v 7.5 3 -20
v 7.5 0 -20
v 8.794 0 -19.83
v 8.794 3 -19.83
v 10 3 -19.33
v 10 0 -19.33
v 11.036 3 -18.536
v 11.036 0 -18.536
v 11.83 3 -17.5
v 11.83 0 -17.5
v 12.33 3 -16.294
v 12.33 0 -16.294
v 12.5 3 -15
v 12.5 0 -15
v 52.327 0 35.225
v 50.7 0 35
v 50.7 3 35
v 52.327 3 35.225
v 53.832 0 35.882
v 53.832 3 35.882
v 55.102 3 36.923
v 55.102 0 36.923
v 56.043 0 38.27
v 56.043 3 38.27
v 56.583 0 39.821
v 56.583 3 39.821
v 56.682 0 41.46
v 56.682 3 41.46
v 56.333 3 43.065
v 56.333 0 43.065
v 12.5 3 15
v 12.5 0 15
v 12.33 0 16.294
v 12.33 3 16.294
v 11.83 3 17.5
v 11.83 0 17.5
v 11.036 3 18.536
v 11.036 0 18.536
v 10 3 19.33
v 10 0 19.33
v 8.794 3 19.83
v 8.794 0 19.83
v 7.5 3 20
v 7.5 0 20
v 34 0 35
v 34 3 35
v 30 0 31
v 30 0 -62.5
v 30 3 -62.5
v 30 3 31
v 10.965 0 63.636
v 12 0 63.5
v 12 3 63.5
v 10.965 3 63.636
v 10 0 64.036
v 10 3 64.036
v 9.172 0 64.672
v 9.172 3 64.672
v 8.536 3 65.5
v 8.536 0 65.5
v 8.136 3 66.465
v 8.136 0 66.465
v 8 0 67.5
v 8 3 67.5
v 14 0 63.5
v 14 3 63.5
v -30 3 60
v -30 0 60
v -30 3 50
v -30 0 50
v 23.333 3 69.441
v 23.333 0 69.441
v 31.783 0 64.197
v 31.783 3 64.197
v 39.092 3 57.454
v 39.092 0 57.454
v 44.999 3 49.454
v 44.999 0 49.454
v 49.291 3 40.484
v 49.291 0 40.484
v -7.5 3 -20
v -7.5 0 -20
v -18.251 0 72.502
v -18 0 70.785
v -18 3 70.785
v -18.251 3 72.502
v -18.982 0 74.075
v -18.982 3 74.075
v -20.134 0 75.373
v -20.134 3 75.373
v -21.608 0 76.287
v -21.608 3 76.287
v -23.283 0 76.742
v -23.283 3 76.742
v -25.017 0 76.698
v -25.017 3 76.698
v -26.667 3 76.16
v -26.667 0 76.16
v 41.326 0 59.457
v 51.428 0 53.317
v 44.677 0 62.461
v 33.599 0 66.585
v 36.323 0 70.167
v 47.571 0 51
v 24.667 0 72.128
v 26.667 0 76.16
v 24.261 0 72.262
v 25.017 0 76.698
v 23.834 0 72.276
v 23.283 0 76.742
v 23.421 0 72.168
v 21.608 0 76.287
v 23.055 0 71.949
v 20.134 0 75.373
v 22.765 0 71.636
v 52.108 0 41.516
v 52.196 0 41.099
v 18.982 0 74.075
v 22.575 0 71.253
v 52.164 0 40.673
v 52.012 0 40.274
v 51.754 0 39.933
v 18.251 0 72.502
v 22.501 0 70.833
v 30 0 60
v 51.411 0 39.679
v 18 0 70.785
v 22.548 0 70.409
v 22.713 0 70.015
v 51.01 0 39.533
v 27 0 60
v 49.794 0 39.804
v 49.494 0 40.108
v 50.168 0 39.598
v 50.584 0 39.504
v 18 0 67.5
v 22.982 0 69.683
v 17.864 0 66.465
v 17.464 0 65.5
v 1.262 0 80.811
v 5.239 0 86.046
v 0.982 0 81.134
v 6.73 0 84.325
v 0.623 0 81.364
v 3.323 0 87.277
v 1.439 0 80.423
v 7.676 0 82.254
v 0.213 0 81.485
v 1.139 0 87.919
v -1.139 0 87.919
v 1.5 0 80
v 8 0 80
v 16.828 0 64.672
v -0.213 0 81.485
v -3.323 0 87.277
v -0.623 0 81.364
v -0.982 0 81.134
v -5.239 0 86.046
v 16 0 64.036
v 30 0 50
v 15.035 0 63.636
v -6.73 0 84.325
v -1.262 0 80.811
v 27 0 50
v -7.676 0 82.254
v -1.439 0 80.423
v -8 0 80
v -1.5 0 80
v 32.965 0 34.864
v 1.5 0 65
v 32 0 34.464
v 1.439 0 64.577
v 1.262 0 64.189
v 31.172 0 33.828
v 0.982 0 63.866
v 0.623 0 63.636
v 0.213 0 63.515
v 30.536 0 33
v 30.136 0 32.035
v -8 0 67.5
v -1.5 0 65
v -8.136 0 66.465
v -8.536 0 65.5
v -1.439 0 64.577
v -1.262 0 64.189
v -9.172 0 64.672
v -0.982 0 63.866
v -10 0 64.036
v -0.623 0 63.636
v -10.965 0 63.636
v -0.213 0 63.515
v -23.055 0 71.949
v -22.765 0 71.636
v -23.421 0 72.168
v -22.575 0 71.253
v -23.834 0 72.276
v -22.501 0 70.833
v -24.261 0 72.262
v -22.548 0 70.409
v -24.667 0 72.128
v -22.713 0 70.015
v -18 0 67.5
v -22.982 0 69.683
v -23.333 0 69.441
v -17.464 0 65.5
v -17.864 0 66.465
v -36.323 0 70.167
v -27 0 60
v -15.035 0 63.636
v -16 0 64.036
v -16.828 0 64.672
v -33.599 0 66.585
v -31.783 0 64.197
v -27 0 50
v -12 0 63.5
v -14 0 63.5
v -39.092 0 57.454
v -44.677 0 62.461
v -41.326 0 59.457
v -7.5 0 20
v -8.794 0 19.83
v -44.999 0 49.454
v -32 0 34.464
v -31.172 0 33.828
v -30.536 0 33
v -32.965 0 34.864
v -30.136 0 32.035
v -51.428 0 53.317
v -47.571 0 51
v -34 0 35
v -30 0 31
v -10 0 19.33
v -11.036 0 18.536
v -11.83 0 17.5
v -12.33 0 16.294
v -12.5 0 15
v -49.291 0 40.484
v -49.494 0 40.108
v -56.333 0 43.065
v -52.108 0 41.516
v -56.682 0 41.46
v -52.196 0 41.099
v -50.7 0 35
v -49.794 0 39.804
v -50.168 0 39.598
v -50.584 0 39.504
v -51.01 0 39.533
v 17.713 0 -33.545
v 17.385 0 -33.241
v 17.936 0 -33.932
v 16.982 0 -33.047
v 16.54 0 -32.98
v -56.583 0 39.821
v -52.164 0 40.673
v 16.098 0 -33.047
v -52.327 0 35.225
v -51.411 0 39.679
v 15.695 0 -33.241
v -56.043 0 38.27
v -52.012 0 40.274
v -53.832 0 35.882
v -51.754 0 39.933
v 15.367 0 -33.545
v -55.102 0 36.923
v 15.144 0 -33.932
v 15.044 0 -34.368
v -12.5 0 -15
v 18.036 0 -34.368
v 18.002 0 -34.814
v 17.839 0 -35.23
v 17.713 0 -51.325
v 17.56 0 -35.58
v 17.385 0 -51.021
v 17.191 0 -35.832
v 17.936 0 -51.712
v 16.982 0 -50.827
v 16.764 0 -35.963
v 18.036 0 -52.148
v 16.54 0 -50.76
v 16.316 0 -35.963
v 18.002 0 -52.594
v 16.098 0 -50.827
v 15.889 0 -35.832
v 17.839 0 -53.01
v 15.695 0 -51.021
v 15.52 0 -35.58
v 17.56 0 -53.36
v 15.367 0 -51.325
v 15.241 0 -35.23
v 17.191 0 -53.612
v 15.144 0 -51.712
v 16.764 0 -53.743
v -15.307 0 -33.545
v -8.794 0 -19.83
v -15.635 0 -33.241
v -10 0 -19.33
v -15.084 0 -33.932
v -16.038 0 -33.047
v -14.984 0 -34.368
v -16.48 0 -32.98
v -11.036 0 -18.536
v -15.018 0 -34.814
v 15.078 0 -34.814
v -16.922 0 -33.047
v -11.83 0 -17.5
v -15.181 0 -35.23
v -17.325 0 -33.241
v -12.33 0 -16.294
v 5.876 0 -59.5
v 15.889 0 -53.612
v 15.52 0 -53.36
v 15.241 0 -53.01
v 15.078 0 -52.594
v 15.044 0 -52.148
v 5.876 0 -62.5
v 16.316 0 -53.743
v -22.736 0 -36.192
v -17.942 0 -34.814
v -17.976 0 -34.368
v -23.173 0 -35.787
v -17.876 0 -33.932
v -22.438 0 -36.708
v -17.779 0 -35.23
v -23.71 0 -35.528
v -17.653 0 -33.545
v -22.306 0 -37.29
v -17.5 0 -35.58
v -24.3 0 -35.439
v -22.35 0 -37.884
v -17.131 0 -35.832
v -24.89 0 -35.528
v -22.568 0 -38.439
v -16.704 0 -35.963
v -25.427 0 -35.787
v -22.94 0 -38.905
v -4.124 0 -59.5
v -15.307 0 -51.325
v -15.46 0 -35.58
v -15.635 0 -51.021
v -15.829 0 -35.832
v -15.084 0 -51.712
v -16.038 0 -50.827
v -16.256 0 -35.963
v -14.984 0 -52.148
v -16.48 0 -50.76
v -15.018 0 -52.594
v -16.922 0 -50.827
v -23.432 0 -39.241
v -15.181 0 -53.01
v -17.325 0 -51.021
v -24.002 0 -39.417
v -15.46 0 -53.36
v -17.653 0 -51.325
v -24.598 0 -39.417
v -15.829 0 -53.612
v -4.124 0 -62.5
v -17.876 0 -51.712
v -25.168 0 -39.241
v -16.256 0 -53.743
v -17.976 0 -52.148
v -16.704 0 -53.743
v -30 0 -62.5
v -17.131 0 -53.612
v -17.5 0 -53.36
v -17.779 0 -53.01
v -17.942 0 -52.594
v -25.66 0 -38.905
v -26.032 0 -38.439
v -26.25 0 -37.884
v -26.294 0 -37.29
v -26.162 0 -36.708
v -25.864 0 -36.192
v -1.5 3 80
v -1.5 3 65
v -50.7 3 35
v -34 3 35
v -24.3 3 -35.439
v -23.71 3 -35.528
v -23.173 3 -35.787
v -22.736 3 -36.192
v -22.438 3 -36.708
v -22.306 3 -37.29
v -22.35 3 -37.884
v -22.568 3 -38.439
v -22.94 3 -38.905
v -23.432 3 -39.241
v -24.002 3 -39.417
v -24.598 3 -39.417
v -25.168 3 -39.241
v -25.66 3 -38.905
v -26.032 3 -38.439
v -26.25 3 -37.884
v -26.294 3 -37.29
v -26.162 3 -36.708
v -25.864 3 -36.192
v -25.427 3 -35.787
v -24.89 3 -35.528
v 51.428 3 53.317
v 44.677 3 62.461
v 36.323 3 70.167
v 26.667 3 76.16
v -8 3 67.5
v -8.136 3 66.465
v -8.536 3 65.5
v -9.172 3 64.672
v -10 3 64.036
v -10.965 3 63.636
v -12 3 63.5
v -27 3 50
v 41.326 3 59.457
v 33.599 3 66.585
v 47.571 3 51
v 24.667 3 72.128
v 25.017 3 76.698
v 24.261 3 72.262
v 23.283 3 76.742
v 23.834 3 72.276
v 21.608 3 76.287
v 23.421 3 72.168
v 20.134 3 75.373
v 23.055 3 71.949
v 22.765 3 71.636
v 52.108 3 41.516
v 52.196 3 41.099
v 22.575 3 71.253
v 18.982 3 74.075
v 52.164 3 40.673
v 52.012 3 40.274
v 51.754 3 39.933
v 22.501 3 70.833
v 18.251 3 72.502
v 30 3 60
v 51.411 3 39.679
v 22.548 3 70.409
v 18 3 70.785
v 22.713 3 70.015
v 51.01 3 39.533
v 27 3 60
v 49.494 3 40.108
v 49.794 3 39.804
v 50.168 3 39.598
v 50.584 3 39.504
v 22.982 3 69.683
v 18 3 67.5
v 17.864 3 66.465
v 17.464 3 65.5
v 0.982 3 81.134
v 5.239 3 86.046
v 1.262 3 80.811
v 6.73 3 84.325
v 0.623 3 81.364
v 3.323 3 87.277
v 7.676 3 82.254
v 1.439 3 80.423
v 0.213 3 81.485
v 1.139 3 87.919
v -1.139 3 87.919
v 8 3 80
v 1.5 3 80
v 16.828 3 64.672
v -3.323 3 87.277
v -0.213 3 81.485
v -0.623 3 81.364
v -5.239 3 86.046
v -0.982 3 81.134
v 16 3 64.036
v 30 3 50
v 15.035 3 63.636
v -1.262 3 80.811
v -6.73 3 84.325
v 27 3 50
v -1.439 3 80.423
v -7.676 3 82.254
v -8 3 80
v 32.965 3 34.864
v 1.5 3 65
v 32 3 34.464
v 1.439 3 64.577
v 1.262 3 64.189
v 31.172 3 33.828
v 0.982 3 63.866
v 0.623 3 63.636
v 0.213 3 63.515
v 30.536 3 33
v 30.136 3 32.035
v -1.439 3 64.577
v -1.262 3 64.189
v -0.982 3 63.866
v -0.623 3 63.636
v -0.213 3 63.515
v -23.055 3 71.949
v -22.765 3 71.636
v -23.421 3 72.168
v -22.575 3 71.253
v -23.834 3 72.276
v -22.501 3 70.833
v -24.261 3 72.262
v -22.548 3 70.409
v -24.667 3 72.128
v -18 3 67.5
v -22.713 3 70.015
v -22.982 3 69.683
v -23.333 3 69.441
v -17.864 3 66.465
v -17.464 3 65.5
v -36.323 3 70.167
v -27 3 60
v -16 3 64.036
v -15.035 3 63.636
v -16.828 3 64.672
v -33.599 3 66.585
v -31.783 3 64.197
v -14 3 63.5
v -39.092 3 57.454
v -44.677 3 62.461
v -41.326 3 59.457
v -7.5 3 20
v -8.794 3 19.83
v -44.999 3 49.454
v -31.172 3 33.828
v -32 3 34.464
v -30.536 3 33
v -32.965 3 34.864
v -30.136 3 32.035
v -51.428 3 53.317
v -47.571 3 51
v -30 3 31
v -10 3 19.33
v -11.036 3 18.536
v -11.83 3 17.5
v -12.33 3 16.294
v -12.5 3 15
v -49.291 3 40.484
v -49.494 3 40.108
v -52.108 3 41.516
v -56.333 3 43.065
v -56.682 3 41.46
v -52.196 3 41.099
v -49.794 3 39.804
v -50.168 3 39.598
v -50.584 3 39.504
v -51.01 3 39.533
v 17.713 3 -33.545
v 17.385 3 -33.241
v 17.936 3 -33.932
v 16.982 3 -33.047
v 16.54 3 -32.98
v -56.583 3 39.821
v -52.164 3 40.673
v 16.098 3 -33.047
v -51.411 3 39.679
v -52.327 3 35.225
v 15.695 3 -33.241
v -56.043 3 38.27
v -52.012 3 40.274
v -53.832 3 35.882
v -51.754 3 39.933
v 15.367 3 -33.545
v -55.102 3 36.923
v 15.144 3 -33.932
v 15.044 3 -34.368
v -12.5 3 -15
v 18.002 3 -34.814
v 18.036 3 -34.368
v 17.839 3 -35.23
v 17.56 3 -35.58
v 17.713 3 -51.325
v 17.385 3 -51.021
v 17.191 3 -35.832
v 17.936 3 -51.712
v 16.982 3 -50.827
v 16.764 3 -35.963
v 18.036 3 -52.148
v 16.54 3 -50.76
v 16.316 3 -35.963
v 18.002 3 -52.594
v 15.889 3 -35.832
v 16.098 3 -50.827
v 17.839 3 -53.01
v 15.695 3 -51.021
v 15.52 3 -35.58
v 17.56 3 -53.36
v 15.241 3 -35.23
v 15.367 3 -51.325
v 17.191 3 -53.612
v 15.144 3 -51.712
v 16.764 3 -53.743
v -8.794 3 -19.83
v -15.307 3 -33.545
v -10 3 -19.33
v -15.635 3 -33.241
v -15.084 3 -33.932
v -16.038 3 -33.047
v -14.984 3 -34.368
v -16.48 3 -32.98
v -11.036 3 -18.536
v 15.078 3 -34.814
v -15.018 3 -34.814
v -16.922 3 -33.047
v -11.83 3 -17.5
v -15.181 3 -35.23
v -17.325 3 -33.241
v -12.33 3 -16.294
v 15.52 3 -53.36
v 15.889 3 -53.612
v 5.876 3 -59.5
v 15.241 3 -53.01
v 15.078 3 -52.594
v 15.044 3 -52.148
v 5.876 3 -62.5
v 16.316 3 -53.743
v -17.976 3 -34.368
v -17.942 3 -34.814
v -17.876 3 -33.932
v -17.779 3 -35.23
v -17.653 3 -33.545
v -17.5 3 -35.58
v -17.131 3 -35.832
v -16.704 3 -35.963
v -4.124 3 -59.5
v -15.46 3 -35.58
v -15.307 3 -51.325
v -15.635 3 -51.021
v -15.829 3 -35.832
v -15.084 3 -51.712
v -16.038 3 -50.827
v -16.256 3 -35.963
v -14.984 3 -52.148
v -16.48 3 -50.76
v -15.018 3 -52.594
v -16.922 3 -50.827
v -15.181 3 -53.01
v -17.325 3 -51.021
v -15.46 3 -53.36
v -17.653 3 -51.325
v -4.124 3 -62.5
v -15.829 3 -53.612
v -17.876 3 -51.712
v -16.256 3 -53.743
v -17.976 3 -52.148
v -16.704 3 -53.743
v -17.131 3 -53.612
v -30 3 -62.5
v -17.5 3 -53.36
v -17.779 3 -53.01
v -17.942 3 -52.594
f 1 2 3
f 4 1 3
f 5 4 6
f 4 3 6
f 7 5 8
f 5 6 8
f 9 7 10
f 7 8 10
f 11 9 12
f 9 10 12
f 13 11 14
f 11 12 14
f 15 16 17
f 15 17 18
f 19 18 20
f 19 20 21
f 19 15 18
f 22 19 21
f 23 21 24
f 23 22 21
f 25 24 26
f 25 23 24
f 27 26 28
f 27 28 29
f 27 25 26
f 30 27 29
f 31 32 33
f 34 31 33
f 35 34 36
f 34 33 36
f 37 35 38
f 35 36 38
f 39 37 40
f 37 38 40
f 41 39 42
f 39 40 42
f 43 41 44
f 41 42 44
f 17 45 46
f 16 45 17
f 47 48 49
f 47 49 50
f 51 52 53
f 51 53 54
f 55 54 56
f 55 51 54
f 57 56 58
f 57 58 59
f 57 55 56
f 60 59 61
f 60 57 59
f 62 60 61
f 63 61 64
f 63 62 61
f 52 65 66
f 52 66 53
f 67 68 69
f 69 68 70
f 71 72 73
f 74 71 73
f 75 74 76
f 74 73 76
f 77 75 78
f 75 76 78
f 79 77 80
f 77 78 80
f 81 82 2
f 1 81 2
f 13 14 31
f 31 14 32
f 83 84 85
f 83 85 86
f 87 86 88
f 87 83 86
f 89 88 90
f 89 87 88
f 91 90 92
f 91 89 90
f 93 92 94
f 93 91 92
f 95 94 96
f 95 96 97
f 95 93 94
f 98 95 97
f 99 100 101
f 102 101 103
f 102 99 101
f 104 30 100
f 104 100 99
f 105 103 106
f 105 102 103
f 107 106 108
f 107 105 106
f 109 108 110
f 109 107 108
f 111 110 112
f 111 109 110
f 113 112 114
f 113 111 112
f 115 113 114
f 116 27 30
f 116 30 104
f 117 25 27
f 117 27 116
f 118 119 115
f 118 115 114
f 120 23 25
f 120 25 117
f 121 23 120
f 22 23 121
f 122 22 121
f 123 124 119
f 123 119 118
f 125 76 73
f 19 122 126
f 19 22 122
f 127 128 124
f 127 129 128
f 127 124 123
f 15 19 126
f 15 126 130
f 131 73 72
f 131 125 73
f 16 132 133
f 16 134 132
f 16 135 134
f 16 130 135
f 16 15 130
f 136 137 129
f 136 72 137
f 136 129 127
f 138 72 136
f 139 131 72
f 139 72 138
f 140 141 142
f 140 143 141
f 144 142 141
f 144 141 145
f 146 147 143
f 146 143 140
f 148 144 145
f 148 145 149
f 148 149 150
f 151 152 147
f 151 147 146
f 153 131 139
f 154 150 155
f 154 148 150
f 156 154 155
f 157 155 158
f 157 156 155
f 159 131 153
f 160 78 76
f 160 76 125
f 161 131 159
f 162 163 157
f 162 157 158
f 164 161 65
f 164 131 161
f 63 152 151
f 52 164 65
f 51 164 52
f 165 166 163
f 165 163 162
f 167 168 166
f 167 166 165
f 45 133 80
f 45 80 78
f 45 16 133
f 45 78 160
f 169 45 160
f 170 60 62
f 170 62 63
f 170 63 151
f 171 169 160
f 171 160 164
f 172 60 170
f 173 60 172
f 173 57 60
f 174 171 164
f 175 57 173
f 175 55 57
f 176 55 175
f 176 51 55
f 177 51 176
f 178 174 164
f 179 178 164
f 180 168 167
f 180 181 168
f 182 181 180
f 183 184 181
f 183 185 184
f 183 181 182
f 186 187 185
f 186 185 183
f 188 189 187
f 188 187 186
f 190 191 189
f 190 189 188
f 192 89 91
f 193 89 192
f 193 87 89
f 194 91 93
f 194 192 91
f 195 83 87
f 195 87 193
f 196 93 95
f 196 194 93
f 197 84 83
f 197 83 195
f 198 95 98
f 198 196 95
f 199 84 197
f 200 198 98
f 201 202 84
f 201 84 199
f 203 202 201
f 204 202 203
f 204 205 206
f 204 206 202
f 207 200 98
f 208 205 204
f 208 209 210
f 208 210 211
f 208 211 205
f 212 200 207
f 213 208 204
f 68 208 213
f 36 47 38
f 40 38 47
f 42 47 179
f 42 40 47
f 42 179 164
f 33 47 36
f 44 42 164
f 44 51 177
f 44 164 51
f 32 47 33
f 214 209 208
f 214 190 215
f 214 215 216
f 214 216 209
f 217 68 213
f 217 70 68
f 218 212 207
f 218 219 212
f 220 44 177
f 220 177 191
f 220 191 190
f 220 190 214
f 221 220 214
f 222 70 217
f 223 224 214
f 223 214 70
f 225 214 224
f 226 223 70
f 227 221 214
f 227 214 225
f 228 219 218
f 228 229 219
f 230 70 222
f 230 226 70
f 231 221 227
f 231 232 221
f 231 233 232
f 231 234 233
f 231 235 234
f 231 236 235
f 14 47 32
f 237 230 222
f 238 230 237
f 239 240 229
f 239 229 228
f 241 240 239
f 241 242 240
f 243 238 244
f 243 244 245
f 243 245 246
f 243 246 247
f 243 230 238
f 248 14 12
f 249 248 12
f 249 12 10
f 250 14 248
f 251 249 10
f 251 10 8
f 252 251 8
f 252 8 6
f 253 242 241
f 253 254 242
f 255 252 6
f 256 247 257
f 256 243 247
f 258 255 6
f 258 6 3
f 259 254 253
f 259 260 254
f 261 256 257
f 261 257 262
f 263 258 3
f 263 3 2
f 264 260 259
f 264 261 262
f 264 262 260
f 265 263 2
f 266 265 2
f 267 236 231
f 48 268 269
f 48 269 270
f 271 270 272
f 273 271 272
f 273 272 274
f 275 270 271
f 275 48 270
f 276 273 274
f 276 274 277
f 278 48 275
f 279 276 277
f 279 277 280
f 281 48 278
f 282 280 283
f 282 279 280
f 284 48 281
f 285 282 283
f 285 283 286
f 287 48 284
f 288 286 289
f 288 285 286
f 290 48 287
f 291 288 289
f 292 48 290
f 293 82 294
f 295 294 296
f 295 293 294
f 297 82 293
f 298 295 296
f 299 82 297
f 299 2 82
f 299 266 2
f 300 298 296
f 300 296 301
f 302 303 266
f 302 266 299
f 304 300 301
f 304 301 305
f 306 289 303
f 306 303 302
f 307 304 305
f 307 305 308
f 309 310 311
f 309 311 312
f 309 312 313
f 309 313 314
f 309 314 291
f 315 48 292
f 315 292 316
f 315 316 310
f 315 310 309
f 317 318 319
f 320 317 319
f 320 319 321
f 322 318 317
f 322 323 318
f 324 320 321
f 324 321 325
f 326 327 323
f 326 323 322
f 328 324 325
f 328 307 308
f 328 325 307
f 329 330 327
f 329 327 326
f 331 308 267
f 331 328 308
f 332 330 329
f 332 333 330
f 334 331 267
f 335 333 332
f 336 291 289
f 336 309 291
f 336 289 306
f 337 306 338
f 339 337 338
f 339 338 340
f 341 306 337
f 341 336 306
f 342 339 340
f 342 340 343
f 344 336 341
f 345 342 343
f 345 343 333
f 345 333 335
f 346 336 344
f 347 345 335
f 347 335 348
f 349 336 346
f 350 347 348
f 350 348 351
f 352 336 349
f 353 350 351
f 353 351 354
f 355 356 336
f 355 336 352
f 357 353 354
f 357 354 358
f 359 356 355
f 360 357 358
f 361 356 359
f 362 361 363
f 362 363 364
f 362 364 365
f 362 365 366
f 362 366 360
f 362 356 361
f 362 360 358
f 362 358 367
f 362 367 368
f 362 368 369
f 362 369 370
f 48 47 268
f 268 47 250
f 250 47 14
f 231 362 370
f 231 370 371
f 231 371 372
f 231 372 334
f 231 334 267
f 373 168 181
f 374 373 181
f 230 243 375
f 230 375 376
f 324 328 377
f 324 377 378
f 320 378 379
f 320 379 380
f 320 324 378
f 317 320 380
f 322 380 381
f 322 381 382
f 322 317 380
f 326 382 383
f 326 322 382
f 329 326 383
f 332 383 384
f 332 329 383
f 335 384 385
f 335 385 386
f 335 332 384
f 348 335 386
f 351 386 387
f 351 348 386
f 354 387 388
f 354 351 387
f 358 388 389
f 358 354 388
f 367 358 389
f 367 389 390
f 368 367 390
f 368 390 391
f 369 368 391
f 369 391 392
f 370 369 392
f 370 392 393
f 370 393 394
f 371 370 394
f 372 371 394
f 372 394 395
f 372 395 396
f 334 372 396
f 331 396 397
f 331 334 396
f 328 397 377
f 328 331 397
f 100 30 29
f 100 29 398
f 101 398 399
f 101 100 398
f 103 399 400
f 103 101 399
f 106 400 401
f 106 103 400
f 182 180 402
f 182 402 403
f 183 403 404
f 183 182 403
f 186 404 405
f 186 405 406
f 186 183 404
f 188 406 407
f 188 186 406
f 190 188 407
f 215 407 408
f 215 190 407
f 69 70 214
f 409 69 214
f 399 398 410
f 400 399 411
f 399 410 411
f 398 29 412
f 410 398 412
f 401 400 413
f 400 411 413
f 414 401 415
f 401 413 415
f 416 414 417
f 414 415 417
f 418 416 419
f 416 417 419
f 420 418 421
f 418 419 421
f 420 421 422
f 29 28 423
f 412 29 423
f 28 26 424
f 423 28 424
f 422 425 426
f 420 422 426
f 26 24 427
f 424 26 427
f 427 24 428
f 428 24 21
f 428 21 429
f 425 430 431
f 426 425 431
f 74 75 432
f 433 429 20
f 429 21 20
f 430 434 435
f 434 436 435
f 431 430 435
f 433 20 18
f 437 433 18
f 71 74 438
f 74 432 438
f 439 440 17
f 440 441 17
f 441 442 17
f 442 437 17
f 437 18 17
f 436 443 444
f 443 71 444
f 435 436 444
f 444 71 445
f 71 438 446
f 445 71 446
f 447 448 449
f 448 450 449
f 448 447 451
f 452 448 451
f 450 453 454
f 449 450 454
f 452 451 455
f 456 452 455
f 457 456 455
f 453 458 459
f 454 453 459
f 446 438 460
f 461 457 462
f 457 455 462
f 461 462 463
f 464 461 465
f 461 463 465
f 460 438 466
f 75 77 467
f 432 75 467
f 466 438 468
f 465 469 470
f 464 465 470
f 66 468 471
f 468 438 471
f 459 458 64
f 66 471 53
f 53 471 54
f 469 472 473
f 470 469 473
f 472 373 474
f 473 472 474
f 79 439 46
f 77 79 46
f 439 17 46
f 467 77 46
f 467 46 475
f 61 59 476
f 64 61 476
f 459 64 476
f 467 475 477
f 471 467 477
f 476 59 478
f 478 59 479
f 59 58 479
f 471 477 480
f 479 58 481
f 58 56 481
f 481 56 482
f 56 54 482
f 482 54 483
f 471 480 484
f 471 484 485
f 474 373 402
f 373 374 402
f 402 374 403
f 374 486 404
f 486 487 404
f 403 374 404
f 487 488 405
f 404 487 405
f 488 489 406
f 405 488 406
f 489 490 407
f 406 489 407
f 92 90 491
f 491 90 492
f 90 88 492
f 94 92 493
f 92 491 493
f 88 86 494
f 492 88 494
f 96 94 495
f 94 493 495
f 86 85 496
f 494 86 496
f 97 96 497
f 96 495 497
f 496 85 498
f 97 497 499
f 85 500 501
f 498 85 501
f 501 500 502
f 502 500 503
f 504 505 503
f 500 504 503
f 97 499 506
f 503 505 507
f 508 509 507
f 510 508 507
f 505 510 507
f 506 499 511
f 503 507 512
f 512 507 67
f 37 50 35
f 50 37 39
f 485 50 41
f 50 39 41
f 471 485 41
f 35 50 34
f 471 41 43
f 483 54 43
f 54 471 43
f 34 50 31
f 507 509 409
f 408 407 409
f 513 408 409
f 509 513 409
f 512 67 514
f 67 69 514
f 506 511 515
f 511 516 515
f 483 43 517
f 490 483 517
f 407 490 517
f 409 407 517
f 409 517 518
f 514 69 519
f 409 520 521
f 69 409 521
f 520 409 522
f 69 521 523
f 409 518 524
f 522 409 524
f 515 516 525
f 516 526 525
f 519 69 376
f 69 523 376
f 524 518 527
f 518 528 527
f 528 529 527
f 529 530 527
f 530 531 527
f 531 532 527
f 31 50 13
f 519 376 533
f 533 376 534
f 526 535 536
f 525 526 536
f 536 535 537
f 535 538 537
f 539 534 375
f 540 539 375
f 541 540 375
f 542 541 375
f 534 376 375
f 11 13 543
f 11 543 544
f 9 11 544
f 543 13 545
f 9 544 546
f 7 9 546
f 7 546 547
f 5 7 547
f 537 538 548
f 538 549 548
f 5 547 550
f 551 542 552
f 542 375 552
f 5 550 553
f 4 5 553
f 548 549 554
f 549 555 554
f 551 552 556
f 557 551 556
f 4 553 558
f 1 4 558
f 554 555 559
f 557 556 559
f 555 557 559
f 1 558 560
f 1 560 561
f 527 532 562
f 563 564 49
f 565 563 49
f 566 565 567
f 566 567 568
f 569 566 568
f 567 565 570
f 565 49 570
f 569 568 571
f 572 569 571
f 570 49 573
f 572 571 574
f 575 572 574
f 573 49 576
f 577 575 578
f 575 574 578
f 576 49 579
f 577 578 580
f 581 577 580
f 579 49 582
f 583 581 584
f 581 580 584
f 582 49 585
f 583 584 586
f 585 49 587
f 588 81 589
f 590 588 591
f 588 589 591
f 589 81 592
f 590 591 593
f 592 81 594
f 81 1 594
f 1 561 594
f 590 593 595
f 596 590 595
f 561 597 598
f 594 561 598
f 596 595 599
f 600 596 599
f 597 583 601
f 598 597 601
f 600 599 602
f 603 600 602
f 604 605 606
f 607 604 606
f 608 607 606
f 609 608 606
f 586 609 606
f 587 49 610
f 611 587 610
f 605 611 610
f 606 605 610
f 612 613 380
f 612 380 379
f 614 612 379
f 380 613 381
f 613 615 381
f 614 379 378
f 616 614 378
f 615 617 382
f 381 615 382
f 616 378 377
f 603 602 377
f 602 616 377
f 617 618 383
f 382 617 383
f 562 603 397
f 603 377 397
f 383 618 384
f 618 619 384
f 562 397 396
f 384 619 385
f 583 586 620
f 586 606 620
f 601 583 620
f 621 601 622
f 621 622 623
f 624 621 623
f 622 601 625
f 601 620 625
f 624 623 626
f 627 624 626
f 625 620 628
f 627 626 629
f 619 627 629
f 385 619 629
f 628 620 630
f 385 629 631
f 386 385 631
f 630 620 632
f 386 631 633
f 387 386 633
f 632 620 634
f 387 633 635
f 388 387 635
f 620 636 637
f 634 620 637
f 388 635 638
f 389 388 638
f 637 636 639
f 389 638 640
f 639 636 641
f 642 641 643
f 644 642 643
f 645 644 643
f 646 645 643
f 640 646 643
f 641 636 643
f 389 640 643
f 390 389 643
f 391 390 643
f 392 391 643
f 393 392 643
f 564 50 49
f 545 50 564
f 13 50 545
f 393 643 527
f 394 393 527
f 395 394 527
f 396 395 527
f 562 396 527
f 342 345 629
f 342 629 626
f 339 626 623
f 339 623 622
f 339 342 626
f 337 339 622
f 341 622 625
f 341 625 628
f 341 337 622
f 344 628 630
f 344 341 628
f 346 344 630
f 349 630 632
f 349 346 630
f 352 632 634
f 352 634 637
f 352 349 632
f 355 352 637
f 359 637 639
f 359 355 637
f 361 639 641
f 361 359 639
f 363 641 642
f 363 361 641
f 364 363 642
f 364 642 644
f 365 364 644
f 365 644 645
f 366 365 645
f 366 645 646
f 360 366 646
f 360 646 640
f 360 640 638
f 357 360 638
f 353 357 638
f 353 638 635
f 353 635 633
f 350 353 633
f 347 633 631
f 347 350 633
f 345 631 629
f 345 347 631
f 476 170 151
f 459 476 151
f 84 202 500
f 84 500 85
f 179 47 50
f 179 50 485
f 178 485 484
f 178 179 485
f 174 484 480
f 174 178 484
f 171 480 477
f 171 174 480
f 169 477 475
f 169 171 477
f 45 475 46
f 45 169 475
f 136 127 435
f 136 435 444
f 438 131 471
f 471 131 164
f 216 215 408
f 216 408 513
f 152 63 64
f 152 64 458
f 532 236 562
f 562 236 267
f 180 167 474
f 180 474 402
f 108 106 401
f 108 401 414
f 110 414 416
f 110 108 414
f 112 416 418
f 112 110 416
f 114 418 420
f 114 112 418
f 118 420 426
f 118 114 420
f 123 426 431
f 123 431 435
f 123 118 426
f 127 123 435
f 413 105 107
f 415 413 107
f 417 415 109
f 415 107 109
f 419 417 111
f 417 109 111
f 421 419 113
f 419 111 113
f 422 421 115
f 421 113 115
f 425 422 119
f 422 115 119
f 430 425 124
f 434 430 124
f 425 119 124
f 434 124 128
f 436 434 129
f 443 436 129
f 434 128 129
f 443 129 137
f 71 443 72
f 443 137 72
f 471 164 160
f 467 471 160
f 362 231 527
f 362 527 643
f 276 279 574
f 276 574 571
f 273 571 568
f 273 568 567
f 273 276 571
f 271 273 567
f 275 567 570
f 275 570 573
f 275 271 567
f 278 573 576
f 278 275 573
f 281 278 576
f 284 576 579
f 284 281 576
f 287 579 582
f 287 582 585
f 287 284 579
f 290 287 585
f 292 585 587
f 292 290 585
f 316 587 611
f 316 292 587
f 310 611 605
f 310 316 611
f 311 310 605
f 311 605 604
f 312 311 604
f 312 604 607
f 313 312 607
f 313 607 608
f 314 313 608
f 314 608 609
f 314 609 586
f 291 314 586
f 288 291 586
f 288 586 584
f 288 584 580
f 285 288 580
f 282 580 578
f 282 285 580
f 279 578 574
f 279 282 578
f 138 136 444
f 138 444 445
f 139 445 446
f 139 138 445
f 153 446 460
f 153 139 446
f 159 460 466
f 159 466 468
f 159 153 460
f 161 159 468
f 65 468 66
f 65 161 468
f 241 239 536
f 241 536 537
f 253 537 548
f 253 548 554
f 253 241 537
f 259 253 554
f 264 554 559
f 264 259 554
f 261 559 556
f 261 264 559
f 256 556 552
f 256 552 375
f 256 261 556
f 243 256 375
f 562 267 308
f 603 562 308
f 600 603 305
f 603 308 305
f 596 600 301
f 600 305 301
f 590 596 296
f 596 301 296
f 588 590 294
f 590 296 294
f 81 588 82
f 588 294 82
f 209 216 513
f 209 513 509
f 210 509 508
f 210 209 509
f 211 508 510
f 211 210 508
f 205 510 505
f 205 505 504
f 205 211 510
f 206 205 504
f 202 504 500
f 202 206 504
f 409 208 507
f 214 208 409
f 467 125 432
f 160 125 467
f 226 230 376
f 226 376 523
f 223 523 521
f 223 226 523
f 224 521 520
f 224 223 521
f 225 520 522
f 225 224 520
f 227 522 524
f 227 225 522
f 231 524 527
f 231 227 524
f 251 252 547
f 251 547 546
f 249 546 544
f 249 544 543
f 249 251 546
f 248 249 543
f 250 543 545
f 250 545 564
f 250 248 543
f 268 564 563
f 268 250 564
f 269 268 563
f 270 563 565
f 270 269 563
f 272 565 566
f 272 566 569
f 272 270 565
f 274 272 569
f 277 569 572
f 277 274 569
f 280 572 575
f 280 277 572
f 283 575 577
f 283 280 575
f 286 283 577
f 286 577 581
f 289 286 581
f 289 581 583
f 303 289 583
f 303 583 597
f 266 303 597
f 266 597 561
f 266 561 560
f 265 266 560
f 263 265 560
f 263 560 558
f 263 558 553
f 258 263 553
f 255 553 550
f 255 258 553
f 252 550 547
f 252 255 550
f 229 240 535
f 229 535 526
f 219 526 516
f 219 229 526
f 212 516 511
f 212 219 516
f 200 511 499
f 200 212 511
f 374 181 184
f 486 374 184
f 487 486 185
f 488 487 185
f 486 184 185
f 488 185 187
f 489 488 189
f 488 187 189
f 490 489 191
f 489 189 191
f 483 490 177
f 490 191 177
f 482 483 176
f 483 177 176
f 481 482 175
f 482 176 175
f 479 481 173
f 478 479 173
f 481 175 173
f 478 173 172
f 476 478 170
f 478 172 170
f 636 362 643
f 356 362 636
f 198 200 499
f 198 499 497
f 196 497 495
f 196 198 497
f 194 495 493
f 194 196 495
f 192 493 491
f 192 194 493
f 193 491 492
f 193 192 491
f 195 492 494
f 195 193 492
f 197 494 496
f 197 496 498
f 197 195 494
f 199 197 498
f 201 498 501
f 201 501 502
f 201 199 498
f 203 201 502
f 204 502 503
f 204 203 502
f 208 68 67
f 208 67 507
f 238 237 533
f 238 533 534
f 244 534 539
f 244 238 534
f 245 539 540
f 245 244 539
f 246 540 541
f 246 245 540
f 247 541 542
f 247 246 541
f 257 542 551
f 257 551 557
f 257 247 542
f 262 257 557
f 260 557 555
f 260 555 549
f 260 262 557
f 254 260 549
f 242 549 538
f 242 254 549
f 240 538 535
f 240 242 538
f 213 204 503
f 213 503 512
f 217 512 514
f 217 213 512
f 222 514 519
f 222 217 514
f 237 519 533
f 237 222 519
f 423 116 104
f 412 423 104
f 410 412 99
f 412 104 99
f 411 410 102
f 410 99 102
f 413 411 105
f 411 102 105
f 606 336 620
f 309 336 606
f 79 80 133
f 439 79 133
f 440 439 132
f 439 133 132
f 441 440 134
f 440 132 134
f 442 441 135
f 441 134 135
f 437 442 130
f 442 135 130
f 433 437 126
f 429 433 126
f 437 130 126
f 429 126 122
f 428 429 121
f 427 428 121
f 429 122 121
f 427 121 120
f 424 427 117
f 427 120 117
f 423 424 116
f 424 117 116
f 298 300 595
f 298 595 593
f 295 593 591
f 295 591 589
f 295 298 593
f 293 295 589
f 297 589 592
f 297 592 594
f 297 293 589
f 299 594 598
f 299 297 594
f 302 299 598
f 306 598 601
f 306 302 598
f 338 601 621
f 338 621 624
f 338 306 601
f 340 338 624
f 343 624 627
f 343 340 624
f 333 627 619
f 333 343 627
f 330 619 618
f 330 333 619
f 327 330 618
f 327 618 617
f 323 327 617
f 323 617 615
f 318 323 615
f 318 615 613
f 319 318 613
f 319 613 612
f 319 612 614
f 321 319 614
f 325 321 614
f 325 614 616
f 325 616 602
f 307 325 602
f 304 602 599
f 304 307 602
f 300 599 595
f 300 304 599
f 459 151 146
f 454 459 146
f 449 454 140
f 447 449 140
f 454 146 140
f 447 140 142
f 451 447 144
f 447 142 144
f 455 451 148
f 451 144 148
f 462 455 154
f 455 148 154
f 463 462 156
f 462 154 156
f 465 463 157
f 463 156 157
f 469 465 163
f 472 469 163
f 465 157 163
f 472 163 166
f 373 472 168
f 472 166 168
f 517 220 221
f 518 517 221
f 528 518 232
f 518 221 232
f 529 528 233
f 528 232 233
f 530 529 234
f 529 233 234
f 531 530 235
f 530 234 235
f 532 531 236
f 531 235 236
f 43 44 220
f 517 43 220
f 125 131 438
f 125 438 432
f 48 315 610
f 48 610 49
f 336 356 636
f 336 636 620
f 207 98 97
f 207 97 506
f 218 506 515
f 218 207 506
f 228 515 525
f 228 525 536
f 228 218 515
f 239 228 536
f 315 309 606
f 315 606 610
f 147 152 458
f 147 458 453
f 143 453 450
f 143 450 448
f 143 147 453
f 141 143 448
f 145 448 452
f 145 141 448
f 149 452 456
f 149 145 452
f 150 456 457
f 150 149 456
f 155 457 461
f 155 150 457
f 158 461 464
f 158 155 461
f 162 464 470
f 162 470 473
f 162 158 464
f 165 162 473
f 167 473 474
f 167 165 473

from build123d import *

# Parameters (mm, degrees)
CROQUIS1_R              = 2
CROQUIS1_R_2            = 1.5
CROQUIS1_W              = 3
CROQUIS1_H              = 10
SALIENTE_EXTRUIR1_DEPTH = 3


with BuildPart() as part:
    # Croquis1 → Saliente-Extruir1 (new body)
    with BuildSketch(Plane(origin=(0, 0, 0), x_dir=(1, 0, 0), z_dir=(0, 1, 0))):
        with BuildLine():
            Line((-30, -21.975186569), (-30, 62.5))
            Line((-30, 62.5), (-4.123983247, 62.5))
            Line((-4.123983247, 62.5), (-4.123983247, 59.5))
            Line((-4.123983247, 59.5), (5.876016753, 59.5))
            Line((5.876016753, 59.5), (5.876016753, 62.5))
            Line((5.876016753, 62.5), (30, 62.5))
            Line((30, 62.5), (30, -21.975186569))
            Line((30, -21.975186569), (30, -31))
            ThreePointArc((30, -31), (31.171572875, -33.828427125), (34, -35))
            Line((34, -35), (50.699653605, -35))
            ThreePointArc((50.699653605, -35), (55.61862518, -37.564345966), (56.332948449, -43.06542712))
            ThreePointArc((56.332948449, -43.06542712), (44.677053609, -62.460636323), (26.666666667, -76.159540905))
            ThreePointArc((26.666666667, -76.159540905), (20.83772234, -75.883721919), (18, -70.784702406))
            Line((18, -70.784702406), (18, -67.5))
            ThreePointArc((18, -67.5), (16.828427125, -64.671572875), (14, -63.5))
            Line((14, -63.5), (12, -63.5))
            ThreePointArc((12, -63.5), (9.171572875, -64.671572875), (8, -67.5))
            Line((8, -67.5), (8, -80))
            ThreePointArc((8, -80), (0, -88), (-8, -80))
            Line((-8, -80), (-8, -67.5))
            ThreePointArc((-8, -67.5), (-9.171572875, -64.671572875), (-12, -63.5))
            Line((-12, -63.5), (-14, -63.5))
            ThreePointArc((-14, -63.5), (-16.828427125, -64.671572875), (-18, -67.5))
            Line((-18, -67.5), (-18, -70.784702406))
            ThreePointArc((-18, -70.784702406), (-20.83772234, -75.883721919), (-26.666666667, -76.159540905))
            ThreePointArc((-26.666666667, -76.159540905), (-44.677053609, -62.460636323), (-56.332948449, -43.06542712))
            ThreePointArc((-56.332948449, -43.06542712), (-55.61862518, -37.564345966), (-50.699653605, -35))
            Line((-50.699653605, -35), (-34, -35))
            ThreePointArc((-34, -35), (-31.171572875, -33.828427125), (-30, -31))
            Line((-30, -31), (-30, -21.975186569))
        make_face()
        with Locations(Location((-24.3, 37.439181633, 0), (0, 0, 270))):
            Circle(CROQUIS1_R, mode=Mode.SUBTRACT)
        with Locations(Location((16.54, 52.26006939, 0), (0, 0, 270))):
            Circle(CROQUIS1_R_2, mode=Mode.SUBTRACT)
        with Locations(Location((16.54, 34.48006939, 0), (0, 0, 270))):
            Circle(CROQUIS1_R_2, mode=Mode.SUBTRACT)
        with Locations(Location((-16.48, 34.48006939, 0), (0, 0, 270))):
            Circle(CROQUIS1_R_2, mode=Mode.SUBTRACT)
        with Locations(Location((-16.48, 52.26006939, 0), (0, 0, 270))):
            Circle(CROQUIS1_R_2, mode=Mode.SUBTRACT)
        with Locations((28.5, -55)):
            Rectangle(CROQUIS1_W, CROQUIS1_H, mode=Mode.SUBTRACT)
        with Locations((-28.5, -55)):
            Rectangle(CROQUIS1_W, CROQUIS1_H, mode=Mode.SUBTRACT)
        with BuildLine():
            Line((1.5, -65), (1.5, -80))
            ThreePointArc((1.5, -80), (0, -81.5), (-1.5, -80))
            Line((-1.5, -80), (-1.5, -65))
            ThreePointArc((-1.5, -65), (0, -63.5), (1.5, -65))
        make_face(mode=Mode.SUBTRACT)
        with BuildLine():
            Line((7.5, -20), (-7.5, -20))
            ThreePointArc((-7.5, -20), (-11.035533906, -18.535533906), (-12.5, -15))
            Line((-12.5, -15), (-12.5, 15))
            ThreePointArc((-12.5, 15), (-11.035533906, 18.535533906), (-7.5, 20))
            Line((-7.5, 20), (7.5, 20))
            ThreePointArc((7.5, 20), (11.035533906, 18.535533906), (12.5, 15))
            Line((12.5, 15), (12.5, -15))
            ThreePointArc((12.5, -15), (11.035533906, -18.535533906), (7.5, -20))
        make_face(mode=Mode.SUBTRACT)
        with BuildLine():
            ThreePointArc((-52.107977316, -41.51635678), (-41.326274588, -59.456925292), (-24.666666667, -72.12841203))
            ThreePointArc((-24.666666667, -72.12841203), (-22.656290375, -71.451369072), (-23.333333333, -69.440992781))
            ThreePointArc((-23.333333333, -69.440992781), (-39.092421908, -57.454451272), (-49.291329893, -40.48364322))
            ThreePointArc((-49.291329893, -40.48364322), (-51.216010385, -39.591676289), (-52.107977316, -41.51635678))
        make_face(mode=Mode.SUBTRACT)
        with BuildLine():
            ThreePointArc((52.107977316, -41.51635678), (41.326274588, -59.456925292), (24.666666667, -72.12841203))
            ThreePointArc((24.666666667, -72.12841203), (22.656290375, -71.451369072), (23.333333333, -69.440992781))
            ThreePointArc((23.333333333, -69.440992781), (39.092421908, -57.454451272), (49.291329893, -40.48364322))
            ThreePointArc((49.291329893, -40.48364322), (51.216010385, -39.591676289), (52.107977316, -41.51635678))
        make_face(mode=Mode.SUBTRACT)
    extrude(amount=SALIENTE_EXTRUIR1_DEPTH)


solid = part.part
